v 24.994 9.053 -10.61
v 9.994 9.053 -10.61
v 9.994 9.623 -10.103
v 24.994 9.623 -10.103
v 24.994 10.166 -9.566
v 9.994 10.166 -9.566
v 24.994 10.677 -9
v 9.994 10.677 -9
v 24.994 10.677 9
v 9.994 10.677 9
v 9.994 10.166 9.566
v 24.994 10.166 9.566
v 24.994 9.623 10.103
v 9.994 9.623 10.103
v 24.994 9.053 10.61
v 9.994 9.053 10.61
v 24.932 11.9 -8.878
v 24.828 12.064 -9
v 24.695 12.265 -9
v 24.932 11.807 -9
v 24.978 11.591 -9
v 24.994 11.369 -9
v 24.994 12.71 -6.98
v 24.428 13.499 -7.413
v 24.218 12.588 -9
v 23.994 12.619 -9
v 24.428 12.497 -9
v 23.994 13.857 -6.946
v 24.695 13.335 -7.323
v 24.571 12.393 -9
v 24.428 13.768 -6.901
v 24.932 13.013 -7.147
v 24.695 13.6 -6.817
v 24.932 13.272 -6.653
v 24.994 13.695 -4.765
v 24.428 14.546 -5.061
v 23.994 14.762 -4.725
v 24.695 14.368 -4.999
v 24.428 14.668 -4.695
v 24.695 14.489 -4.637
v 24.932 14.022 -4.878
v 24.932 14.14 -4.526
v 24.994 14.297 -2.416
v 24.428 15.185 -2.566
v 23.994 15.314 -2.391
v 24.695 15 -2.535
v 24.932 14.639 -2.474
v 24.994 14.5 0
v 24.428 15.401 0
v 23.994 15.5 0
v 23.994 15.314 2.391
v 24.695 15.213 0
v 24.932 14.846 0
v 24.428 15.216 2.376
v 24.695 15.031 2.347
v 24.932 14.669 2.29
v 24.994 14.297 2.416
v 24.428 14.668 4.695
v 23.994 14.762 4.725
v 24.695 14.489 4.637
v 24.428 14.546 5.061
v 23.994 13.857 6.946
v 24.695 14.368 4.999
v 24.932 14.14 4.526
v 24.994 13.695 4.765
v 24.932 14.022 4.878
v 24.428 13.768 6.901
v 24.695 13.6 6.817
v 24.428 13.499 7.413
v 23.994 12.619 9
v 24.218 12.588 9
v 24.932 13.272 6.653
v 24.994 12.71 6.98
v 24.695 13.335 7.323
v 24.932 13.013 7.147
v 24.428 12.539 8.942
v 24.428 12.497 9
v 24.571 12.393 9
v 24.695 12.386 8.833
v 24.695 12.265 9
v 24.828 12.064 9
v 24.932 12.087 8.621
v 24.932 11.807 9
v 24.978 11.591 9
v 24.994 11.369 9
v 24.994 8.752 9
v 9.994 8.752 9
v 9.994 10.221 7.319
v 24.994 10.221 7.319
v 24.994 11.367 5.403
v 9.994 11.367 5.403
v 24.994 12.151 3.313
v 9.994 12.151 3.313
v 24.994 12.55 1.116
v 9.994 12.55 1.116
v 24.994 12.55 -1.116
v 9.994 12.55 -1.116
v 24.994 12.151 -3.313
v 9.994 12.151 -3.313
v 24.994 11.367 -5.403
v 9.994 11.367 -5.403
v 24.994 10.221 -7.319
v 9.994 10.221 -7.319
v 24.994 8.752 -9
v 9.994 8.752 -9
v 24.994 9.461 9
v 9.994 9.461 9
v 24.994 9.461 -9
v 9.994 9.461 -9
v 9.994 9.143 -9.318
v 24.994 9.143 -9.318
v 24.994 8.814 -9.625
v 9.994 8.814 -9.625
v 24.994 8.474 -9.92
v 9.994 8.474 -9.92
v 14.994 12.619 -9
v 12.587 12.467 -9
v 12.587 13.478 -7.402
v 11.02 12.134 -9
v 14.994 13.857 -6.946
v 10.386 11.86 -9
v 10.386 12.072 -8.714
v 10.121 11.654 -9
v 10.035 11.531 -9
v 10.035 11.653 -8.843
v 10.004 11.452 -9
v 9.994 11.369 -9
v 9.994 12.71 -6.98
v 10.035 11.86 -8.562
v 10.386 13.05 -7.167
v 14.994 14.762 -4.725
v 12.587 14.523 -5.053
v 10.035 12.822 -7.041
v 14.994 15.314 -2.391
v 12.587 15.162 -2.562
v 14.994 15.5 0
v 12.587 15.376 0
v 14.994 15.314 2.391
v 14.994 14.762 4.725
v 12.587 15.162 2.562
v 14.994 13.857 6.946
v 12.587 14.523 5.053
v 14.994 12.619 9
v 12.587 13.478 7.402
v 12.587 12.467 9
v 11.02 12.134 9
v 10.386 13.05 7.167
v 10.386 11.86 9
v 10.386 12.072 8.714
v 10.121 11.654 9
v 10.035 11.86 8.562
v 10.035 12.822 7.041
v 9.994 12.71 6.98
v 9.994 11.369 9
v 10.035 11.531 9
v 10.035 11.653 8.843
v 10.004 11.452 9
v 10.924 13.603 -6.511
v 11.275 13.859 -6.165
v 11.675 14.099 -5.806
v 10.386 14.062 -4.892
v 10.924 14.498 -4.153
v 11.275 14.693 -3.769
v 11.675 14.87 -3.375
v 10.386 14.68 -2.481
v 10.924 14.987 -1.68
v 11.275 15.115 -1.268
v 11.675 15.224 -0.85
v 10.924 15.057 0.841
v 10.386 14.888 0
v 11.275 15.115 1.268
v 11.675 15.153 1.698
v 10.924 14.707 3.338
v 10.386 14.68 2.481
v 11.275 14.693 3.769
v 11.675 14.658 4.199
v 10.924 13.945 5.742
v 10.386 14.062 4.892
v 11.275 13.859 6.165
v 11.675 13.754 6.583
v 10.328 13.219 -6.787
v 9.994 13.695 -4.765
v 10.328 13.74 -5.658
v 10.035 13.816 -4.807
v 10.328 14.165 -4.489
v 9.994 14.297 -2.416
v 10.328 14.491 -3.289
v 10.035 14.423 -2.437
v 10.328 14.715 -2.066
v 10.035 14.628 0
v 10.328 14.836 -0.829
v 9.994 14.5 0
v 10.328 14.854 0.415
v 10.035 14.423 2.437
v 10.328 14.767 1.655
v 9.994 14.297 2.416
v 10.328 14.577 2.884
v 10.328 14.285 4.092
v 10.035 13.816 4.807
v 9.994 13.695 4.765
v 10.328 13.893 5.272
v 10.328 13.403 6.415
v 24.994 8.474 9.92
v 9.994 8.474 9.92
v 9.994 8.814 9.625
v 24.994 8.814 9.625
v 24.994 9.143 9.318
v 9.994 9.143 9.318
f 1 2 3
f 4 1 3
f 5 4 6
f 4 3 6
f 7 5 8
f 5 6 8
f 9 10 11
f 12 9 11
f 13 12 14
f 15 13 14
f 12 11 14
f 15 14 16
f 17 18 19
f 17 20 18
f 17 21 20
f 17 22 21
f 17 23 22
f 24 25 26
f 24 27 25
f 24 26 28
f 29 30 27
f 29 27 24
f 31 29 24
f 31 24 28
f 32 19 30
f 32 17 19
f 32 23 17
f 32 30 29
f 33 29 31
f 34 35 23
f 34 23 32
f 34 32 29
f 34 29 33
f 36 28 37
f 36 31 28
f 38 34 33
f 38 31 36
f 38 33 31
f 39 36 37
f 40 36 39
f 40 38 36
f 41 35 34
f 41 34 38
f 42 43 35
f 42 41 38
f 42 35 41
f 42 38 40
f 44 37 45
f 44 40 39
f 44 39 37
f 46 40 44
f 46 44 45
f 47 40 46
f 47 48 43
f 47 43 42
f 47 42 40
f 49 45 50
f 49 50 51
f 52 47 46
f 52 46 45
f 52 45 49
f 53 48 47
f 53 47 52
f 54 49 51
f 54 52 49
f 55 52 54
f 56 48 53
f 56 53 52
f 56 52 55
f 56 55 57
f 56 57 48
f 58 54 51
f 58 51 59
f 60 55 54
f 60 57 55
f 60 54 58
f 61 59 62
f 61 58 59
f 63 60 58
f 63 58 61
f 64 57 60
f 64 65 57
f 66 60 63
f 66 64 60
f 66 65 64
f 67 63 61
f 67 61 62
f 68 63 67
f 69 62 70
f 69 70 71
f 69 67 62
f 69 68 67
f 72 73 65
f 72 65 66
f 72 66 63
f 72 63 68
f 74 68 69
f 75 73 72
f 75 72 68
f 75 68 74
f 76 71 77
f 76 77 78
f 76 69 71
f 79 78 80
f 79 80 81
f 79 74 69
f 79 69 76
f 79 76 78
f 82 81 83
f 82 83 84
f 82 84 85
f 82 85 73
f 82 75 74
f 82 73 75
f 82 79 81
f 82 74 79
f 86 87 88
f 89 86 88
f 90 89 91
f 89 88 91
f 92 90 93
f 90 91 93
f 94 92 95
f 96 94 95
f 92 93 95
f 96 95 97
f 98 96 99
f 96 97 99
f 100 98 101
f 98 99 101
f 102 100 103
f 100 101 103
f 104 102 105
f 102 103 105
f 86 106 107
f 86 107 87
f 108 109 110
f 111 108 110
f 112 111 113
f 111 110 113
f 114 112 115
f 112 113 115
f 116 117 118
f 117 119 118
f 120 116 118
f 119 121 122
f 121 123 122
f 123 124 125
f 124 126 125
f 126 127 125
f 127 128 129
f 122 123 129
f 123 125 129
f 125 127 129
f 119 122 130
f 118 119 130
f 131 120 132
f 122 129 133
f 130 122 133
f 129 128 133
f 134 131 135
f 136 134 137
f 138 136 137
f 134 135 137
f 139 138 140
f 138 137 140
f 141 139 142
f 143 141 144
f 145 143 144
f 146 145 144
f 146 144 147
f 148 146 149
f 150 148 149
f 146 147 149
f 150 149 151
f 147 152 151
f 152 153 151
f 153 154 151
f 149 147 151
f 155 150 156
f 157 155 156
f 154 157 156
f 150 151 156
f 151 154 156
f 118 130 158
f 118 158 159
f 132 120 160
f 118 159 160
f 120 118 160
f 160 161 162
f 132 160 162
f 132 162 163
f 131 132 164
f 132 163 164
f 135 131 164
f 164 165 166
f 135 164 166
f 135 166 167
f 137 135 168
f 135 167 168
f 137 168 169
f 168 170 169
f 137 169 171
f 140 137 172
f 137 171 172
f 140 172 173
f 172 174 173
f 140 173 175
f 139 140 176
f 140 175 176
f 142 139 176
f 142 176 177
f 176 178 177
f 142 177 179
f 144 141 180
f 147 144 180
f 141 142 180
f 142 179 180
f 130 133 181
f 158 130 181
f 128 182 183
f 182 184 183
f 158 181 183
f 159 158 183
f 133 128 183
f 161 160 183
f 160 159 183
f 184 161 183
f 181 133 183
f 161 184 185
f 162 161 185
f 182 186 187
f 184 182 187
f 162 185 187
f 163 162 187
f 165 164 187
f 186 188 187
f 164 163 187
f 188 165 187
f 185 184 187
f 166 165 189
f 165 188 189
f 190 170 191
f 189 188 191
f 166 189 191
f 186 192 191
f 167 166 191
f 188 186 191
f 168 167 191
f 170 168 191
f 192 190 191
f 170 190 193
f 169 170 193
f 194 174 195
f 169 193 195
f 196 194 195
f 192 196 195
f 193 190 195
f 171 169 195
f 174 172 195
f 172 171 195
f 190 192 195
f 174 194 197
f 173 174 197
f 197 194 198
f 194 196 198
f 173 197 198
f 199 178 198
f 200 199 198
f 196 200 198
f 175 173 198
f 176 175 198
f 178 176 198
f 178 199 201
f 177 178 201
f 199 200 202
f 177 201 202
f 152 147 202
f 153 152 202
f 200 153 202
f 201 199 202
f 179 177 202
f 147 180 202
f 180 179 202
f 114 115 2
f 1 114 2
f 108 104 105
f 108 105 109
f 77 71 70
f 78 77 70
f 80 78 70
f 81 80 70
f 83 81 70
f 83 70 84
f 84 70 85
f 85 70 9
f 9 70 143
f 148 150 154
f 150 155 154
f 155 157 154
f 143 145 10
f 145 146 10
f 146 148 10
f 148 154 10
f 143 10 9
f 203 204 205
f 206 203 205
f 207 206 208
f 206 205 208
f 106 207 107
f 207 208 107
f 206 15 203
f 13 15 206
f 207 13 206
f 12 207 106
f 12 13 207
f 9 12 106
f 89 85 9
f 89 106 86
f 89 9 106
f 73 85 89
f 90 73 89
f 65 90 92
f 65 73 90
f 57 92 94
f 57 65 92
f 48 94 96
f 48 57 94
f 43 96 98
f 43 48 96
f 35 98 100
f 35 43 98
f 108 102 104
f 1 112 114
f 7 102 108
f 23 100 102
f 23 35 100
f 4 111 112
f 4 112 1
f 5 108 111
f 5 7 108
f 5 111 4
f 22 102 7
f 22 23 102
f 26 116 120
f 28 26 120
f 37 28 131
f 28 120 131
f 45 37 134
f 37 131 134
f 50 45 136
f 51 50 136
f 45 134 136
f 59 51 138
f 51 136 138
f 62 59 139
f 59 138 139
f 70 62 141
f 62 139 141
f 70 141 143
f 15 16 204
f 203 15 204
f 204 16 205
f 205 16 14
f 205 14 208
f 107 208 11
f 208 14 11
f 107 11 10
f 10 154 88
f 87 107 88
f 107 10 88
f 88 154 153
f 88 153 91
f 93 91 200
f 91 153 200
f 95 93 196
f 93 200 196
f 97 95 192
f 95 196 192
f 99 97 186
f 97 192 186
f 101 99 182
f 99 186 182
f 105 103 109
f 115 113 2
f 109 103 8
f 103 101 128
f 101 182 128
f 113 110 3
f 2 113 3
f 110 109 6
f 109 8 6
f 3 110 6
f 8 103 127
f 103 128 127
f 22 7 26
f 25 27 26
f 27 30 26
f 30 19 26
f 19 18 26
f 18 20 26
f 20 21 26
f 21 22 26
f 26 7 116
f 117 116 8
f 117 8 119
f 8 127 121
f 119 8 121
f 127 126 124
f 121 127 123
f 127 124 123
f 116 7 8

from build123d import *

# Parameters (mm, degrees)
P_IDAT_VYSUNUT_M2_DEPTH  = 15
SKICA3_W                 = 28.958839484
SKICA3_H                 = 34.368053108
ODEBRAT_VYSUNUT_M2_DEPTH = 19.470465231
ZAOBLIT7_R               = 1
ZAOBLIT8_SIZE            = 5
ZAOBLIT8_SIZE_2          = 1


# Read off the part's stored shape, not the designer's step: Přidat vysunutím2
with BuildPart() as part:
    # Skica1 → Rotovat1 (revolve)
    with BuildSketch(Plane.XY, mode=Mode.PRIVATE) as rotovat1_sk:
        with BuildLine():
            Line((-18.006318941, 12.994441011), (-18.006318941, 0))
            Line((-18.006318941, 0), (-15.006318941, 0))
            Line((-15.006318941, 0), (-15.006318941, 10.5))
            Line((-15.006318941, 10.5), (-5.006318941, 10.5))
            Line((-5.006318941, 10.5), (-5.006318941, 12.5))
            Line((-5.006318941, 12.5), (7.993681059, 12.5))
            Line((7.993681059, 12.5), (9.993681059, 12.604815559))
            Line((9.993681059, 12.604815559), (9.993681059, 14.5))
            ThreePointArc((9.993681059, 14.5), (9.70078784, 15.207106781), (8.993681059, 15.5))
            Line((8.993681059, 15.5), (-4.506318941, 15.5))
            Line((-4.506318941, 15.5), (-18.006318941, 12.994441011))
        make_face()
    revolve(rotovat1_sk.sketch.rotate(Axis((-22.002499385, 0, 0), (1, 0, 0)), 90), axis=Axis((-22.002499385, 0, 0), (1, 0, 0)))

    # Přidat vysunutím2 outline → Přidat vysunutím2 (add)
    with BuildSketch(Plane(origin=(9.993681059, 0, 0), x_dir=(0, 0, -1), z_dir=(1, 0, 0))):
        with BuildLine():
            ThreePointArc((9, 12.619429464), (0, 15.5), (-9, 12.619429464))
            Line((-9, 12.619429464), (-9, 10.677226605))
            ThreePointArc((-9, 10.677226605), (-9.838449164, 9.89820076), (-10.609715537, 9.052608394))
            Line((-10.609715537, 9.052608394), (-9.920275538, 8.474099545))
            ThreePointArc((-9.920275538, 8.474099545), (-9.473009337, 8.979756174), (-9, 9.461417722))
            Line((-9, 9.461417722), (-9, 8.752470575))
            ThreePointArc((-9, 8.752470575), (0, 12.6), (9, 8.752470575))
            Line((9, 8.752470575), (9, 9.461417722))
            ThreePointArc((9, 9.461417722), (9.473009337, 8.979756174), (9.920275538, 8.474099545))
            Line((9.920275538, 8.474099545), (10.609715537, 9.052608394))
            ThreePointArc((10.609715537, 9.052608394), (9.838449164, 9.89820076), (9, 10.677226605))
            Line((9, 10.677226605), (9, 12.619429464))
        make_face()
    extrude(amount=P_IDAT_VYSUNUT_M2_DEPTH)

    # Skica3 → Odebrat vysunutím2 (cut, symmetric)
    with BuildSketch(Plane.XY):
        with Locations((-4.485738683, -0.096675255)):
            Rectangle(SKICA3_W, SKICA3_H)
    extrude(amount=ODEBRAT_VYSUNUT_M2_DEPTH, both=True, mode=Mode.SUBTRACT)

    # Zaoblit7
    zaoblit7_edges = [part.edges().sort_by_distance(p)[0] for p in [
        (24.993681059, 15.5, 0),
    ]]
    fillet(zaoblit7_edges, radius=ZAOBLIT7_R)

    # Zaoblit8
    # an asymmetric fillet: 5, 1 mm, written as the material it takes off along each edge
    with BuildSketch(Plane(origin=(9.993681059, 1e-09, 0), x_dir=(0, 0.1441186549809942, -0.9895604141670529), z_dir=(0, -0.9895604141670529, -0.1441186549809942))) as zaoblit8_piece_1:
        with BuildLine():
            Bezier((15.499999999, ZAOBLIT8_SIZE), (15.499999999, 0), (15.499999999 - ZAOBLIT8_SIZE_2, 0), weights=[1, 0.707106781, 1])
            Line((15.499999999 - ZAOBLIT8_SIZE_2, 0), (15.499999999, 0))
            Line((15.499999999, 0), (15.499999999, ZAOBLIT8_SIZE))
        make_face()
    revolve(axis=Axis((9.993681059, 1e-09, 0), (1, 0, 0)), revolution_arc=163.427508421, mode=Mode.SUBTRACT)


solid = part.part
